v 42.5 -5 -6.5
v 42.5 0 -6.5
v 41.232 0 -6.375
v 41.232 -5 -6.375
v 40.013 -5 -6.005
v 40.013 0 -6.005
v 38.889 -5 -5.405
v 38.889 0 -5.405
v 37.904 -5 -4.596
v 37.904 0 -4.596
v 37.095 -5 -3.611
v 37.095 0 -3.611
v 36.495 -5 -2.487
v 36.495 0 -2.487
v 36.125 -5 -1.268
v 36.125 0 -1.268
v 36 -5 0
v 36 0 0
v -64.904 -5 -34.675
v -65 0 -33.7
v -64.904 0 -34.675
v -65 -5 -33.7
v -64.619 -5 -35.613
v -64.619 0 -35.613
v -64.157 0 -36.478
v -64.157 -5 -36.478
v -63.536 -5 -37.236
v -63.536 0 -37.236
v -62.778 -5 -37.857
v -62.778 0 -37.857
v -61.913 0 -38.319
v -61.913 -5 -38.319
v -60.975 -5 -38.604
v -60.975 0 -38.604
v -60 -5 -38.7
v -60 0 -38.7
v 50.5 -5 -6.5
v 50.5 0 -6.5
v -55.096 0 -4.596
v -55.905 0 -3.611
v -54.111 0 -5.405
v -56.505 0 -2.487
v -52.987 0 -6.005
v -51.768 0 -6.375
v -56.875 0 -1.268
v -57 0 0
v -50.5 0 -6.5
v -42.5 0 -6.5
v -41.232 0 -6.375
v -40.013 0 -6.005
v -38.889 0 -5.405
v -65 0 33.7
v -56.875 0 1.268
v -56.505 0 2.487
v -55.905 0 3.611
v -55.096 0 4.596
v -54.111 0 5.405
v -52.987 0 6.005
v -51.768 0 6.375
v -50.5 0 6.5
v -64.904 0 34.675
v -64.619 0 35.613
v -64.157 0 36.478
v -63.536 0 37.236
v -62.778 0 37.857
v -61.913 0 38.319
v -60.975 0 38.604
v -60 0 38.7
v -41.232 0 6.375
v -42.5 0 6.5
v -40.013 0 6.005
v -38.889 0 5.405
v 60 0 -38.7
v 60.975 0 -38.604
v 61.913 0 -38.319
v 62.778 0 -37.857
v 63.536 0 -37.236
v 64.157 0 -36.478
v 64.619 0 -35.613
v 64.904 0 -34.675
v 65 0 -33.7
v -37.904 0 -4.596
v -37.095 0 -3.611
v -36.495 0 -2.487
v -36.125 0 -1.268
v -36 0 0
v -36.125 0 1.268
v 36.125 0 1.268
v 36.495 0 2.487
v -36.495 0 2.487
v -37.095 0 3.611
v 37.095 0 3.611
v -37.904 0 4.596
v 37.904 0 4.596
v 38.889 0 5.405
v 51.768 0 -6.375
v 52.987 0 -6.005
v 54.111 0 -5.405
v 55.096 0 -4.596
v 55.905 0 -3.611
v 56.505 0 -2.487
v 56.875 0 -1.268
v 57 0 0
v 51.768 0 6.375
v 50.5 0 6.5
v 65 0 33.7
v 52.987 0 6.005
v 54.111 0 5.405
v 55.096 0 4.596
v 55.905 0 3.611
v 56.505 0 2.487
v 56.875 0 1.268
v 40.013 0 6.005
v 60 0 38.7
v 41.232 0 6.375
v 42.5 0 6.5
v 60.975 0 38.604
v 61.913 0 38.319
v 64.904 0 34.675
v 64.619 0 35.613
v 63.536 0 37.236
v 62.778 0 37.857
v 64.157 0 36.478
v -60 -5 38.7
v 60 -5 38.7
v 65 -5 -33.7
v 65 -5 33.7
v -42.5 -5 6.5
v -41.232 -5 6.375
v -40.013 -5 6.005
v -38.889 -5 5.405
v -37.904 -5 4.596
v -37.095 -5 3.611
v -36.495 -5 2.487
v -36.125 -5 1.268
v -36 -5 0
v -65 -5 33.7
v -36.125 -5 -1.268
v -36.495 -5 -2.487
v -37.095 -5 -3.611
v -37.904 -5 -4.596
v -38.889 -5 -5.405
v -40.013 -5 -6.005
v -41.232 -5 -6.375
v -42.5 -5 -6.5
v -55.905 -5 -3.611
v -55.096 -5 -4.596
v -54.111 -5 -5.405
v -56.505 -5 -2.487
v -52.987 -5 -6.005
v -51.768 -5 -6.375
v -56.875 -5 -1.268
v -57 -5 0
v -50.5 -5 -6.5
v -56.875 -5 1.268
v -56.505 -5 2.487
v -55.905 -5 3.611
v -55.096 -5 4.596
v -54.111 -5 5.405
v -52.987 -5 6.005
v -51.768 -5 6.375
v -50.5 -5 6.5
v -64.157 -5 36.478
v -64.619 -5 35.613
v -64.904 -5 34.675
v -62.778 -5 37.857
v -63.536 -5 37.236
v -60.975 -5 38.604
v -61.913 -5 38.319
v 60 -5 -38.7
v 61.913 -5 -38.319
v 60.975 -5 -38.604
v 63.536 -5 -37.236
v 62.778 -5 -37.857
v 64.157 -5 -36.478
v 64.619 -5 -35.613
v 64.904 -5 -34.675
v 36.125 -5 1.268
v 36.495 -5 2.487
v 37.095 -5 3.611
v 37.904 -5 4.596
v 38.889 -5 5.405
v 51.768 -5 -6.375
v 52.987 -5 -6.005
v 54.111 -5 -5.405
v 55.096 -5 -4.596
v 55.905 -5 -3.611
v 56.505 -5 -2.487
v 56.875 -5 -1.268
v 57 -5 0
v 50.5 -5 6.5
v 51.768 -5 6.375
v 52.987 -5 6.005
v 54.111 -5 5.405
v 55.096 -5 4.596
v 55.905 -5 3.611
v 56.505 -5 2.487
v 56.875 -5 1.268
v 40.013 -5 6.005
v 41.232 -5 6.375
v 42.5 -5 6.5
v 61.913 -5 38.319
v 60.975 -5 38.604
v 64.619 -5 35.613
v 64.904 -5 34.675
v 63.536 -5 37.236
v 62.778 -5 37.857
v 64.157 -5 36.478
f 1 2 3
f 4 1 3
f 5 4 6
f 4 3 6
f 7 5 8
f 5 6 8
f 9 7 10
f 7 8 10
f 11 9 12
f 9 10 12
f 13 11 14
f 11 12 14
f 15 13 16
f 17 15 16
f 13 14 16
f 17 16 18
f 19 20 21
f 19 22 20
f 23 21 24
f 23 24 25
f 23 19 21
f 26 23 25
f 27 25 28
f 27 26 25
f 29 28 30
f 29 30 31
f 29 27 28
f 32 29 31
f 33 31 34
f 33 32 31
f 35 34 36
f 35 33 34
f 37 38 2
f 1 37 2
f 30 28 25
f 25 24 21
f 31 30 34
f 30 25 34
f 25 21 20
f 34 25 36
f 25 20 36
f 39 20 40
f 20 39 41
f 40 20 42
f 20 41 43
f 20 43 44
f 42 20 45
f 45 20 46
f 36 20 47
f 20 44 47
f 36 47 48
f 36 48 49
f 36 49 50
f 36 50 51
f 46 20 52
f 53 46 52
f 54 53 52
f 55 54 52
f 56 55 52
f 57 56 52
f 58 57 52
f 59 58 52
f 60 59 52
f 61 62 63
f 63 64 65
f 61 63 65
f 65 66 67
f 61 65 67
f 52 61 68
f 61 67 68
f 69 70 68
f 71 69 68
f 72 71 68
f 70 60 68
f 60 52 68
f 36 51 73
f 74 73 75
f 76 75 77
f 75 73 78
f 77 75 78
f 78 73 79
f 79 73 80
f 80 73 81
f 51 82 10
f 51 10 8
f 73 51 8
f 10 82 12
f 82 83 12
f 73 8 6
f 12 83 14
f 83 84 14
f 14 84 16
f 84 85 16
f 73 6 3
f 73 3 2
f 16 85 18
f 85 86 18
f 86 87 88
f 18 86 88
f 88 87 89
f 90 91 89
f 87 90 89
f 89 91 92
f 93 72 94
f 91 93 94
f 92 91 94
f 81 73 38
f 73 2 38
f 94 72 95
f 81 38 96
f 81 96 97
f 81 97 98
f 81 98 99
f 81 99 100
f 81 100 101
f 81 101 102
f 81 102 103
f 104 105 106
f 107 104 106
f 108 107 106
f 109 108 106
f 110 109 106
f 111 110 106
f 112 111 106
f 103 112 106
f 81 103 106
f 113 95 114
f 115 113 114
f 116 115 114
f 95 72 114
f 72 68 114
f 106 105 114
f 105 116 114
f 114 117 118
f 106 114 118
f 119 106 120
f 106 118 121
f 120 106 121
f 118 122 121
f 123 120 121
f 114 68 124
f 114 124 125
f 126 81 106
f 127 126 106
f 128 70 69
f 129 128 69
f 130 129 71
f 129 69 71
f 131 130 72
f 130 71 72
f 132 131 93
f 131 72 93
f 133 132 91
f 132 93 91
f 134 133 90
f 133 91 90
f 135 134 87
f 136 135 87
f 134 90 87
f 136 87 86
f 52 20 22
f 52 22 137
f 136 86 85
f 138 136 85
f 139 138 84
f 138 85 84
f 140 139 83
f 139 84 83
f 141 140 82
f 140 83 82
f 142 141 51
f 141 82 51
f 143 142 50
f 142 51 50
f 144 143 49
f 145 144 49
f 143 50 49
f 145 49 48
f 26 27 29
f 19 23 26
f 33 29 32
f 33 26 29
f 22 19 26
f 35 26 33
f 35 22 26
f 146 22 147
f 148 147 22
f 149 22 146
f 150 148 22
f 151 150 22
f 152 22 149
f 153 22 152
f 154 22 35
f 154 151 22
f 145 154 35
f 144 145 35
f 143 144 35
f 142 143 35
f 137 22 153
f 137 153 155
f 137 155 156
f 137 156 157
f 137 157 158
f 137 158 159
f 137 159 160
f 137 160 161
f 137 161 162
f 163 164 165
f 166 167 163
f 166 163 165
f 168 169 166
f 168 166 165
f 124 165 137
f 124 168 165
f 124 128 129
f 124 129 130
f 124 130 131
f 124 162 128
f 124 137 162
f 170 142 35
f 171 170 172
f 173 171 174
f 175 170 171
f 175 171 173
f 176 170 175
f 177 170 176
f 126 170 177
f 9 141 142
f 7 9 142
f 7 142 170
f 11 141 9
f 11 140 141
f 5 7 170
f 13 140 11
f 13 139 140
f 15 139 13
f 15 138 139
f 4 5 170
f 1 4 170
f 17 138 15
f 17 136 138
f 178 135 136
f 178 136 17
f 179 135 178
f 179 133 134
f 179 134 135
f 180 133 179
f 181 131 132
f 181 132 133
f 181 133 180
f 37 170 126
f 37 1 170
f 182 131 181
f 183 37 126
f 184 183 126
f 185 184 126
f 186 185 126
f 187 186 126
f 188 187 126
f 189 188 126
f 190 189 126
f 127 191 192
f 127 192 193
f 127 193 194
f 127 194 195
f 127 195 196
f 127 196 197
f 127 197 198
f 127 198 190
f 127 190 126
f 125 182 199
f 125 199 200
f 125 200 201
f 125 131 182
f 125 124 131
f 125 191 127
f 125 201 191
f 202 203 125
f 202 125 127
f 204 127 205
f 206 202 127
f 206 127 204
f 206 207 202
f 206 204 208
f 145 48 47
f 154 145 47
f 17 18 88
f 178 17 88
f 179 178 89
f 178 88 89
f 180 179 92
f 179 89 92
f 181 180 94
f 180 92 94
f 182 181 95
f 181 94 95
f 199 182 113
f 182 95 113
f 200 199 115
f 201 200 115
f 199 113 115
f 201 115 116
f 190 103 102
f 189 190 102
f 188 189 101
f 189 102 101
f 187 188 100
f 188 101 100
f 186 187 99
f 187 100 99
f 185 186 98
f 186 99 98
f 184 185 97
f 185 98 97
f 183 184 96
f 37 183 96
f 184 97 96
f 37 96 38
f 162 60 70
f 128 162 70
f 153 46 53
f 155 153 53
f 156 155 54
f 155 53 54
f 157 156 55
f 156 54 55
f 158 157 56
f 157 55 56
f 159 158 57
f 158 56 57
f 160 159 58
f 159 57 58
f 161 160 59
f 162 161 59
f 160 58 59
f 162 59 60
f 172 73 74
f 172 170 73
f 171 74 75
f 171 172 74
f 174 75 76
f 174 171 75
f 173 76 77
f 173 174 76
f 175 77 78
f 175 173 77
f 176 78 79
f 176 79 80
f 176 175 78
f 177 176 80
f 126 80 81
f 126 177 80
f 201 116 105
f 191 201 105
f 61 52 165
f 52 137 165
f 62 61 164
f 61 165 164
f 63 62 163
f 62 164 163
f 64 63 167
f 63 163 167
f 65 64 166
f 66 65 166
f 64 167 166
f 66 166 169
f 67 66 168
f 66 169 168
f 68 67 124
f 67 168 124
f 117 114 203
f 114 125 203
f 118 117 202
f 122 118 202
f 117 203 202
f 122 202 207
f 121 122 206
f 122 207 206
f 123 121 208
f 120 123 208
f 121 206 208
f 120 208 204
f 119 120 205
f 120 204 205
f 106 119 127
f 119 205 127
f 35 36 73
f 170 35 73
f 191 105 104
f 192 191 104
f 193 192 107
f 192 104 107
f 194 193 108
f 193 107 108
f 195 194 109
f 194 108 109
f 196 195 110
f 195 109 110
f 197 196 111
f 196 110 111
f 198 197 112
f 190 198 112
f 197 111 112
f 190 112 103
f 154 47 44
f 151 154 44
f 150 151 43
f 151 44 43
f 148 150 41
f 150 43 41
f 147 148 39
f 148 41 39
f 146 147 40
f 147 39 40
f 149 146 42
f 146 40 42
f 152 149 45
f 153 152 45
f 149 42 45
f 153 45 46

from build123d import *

# Parameters (mm, degrees)
F0_W     = 130
F0_H     = 77.4
F1_DEPTH = 5
F2_R     = 5


with BuildPart() as f1:
    # F0 (on Front) → F1 (new body)
    with BuildSketch(Plane.XZ):
        Rectangle(F0_W, F0_H)
        with BuildLine():
            ThreePointArc((-36, 0), (-37.903806, -4.596194), (-42.5, -6.5))
            Line((-42.5, -6.5), (-50.5, -6.5))
            ThreePointArc((-50.5, -6.5), (-55.096194, -4.596194), (-57, 0))
            ThreePointArc((-57, 0), (-55.096194, 4.596194), (-50.5, 6.5))
            Line((-50.5, 6.5), (-42.5, 6.5))
            ThreePointArc((-42.5, 6.5), (-37.903806, 4.596194), (-36, 0))
        make_face(mode=Mode.SUBTRACT)
        with BuildLine():
            ThreePointArc((50.5, 6.5), (55.096194, 4.596194), (57, 0))
            ThreePointArc((57, 0), (55.096194, -4.596194), (50.5, -6.5))
            Line((50.5, -6.5), (42.5, -6.5))
            ThreePointArc((42.5, -6.5), (37.903806, -4.596194), (36, 0))
            ThreePointArc((36, 0), (37.903806, 4.596194), (42.5, 6.5))
            Line((42.5, 6.5), (50.5, 6.5))
        make_face(mode=Mode.SUBTRACT)
    extrude(amount=F1_DEPTH)

    # F2
    f2_edges = [f1.edges().sort_by_distance(p)[0] for p in [
        (65, -2.5, 38.7),
        (65, -2.5, -38.7),
        (-65, -2.5, -38.7),
        (-65, -2.5, 38.7),
    ]]
    fillet(f2_edges, radius=F2_R)


solid = f1.part
